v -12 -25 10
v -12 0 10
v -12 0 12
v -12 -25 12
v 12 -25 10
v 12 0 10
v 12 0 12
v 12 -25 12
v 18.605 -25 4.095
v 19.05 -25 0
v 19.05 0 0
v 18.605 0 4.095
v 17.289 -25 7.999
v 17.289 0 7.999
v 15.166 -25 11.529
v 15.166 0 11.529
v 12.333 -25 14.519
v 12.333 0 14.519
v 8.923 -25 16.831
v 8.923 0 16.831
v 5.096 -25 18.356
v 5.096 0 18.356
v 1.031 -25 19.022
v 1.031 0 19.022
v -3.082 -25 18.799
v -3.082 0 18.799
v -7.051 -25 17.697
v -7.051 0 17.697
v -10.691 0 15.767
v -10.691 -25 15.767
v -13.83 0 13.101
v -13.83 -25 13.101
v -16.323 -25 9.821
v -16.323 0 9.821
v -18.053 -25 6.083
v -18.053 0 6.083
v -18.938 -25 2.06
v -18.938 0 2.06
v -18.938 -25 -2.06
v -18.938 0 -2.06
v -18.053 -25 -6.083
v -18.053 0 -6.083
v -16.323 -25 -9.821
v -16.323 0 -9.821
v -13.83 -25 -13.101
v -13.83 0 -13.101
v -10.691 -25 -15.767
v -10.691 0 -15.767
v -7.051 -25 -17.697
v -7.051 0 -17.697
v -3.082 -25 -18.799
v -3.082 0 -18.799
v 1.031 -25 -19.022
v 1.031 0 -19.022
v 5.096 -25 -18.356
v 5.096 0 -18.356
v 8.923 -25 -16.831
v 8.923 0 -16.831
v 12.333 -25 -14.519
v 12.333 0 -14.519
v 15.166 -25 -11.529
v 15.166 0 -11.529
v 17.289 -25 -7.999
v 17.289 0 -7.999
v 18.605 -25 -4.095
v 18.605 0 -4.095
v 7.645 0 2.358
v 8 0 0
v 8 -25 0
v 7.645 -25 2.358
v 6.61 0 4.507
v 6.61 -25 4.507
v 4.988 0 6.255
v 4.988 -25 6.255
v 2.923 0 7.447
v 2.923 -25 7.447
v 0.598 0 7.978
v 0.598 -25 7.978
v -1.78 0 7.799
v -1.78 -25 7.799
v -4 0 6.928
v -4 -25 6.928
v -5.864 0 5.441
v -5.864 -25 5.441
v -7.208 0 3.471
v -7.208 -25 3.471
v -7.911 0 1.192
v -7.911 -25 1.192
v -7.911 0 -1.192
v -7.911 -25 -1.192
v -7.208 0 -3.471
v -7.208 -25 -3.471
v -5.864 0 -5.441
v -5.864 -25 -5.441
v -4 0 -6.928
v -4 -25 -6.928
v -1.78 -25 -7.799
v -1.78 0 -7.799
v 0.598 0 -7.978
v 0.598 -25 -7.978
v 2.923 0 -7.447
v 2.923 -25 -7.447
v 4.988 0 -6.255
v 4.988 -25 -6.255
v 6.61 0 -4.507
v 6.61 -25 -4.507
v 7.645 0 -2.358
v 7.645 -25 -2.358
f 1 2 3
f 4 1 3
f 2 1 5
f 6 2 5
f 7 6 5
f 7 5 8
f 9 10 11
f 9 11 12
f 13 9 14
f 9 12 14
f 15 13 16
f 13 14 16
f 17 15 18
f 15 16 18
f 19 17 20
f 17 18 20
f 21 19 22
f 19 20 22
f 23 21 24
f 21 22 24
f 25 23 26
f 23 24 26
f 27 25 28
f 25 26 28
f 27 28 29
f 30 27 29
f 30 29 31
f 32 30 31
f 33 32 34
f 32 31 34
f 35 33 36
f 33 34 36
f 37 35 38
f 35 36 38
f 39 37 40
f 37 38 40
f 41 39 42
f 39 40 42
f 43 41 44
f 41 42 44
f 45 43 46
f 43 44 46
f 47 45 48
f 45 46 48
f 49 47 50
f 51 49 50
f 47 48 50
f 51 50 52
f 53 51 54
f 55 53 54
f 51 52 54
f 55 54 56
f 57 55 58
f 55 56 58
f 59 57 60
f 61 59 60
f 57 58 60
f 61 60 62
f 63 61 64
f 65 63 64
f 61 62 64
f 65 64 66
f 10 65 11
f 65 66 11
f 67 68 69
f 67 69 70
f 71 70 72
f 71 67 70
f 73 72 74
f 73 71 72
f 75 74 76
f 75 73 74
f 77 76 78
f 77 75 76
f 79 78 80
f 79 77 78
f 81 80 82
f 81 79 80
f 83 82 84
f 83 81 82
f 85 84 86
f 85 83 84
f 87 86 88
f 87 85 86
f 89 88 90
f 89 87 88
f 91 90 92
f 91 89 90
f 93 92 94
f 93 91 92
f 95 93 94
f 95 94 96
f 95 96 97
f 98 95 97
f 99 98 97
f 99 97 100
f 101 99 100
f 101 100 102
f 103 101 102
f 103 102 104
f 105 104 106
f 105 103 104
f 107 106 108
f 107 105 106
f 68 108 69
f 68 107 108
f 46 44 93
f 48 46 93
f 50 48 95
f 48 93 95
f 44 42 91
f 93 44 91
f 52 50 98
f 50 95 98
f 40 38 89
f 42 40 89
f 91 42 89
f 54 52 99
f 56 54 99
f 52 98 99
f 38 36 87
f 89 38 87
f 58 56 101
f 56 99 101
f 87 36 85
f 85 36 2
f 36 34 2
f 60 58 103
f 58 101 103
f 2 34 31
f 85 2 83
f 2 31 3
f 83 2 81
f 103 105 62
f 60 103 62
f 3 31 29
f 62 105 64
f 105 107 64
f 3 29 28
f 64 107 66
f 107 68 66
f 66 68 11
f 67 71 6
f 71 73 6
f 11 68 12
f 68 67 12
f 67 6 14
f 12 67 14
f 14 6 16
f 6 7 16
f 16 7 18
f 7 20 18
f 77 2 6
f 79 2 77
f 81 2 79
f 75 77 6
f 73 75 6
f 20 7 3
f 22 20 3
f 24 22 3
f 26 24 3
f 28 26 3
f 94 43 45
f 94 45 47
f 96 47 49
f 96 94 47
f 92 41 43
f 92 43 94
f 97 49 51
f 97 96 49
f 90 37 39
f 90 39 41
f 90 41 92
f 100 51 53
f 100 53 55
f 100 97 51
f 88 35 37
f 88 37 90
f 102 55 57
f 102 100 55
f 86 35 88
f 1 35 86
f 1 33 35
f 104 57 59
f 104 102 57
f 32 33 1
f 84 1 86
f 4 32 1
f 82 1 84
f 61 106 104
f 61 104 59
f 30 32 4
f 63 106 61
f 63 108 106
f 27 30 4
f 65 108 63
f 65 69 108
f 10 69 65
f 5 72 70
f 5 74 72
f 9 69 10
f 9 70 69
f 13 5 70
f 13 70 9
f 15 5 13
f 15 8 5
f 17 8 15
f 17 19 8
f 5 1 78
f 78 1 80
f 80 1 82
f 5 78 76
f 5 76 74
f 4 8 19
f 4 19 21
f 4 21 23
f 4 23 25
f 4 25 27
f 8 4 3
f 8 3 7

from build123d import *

# Parameters (mm, degrees)
F0_R     = 19.05
F0_R_2   = 8
F0_W     = 24
F0_H     = 2
F3_DEPTH = 25


# Not quite as in the source:
# - the program builds the solid bodies; features that only make, move or delete a surface that nothing else refers to are left out


with BuildPart() as f3:
    # F0 (on Front) → F3 (new body)
    with BuildSketch(Plane.XZ):
        Circle(F0_R)
        Circle(F0_R_2, mode=Mode.SUBTRACT)
        with Locations((0, 11)):
            Rectangle(F0_W, F0_H, mode=Mode.SUBTRACT)
    extrude(amount=F3_DEPTH)


solid = f3.part
